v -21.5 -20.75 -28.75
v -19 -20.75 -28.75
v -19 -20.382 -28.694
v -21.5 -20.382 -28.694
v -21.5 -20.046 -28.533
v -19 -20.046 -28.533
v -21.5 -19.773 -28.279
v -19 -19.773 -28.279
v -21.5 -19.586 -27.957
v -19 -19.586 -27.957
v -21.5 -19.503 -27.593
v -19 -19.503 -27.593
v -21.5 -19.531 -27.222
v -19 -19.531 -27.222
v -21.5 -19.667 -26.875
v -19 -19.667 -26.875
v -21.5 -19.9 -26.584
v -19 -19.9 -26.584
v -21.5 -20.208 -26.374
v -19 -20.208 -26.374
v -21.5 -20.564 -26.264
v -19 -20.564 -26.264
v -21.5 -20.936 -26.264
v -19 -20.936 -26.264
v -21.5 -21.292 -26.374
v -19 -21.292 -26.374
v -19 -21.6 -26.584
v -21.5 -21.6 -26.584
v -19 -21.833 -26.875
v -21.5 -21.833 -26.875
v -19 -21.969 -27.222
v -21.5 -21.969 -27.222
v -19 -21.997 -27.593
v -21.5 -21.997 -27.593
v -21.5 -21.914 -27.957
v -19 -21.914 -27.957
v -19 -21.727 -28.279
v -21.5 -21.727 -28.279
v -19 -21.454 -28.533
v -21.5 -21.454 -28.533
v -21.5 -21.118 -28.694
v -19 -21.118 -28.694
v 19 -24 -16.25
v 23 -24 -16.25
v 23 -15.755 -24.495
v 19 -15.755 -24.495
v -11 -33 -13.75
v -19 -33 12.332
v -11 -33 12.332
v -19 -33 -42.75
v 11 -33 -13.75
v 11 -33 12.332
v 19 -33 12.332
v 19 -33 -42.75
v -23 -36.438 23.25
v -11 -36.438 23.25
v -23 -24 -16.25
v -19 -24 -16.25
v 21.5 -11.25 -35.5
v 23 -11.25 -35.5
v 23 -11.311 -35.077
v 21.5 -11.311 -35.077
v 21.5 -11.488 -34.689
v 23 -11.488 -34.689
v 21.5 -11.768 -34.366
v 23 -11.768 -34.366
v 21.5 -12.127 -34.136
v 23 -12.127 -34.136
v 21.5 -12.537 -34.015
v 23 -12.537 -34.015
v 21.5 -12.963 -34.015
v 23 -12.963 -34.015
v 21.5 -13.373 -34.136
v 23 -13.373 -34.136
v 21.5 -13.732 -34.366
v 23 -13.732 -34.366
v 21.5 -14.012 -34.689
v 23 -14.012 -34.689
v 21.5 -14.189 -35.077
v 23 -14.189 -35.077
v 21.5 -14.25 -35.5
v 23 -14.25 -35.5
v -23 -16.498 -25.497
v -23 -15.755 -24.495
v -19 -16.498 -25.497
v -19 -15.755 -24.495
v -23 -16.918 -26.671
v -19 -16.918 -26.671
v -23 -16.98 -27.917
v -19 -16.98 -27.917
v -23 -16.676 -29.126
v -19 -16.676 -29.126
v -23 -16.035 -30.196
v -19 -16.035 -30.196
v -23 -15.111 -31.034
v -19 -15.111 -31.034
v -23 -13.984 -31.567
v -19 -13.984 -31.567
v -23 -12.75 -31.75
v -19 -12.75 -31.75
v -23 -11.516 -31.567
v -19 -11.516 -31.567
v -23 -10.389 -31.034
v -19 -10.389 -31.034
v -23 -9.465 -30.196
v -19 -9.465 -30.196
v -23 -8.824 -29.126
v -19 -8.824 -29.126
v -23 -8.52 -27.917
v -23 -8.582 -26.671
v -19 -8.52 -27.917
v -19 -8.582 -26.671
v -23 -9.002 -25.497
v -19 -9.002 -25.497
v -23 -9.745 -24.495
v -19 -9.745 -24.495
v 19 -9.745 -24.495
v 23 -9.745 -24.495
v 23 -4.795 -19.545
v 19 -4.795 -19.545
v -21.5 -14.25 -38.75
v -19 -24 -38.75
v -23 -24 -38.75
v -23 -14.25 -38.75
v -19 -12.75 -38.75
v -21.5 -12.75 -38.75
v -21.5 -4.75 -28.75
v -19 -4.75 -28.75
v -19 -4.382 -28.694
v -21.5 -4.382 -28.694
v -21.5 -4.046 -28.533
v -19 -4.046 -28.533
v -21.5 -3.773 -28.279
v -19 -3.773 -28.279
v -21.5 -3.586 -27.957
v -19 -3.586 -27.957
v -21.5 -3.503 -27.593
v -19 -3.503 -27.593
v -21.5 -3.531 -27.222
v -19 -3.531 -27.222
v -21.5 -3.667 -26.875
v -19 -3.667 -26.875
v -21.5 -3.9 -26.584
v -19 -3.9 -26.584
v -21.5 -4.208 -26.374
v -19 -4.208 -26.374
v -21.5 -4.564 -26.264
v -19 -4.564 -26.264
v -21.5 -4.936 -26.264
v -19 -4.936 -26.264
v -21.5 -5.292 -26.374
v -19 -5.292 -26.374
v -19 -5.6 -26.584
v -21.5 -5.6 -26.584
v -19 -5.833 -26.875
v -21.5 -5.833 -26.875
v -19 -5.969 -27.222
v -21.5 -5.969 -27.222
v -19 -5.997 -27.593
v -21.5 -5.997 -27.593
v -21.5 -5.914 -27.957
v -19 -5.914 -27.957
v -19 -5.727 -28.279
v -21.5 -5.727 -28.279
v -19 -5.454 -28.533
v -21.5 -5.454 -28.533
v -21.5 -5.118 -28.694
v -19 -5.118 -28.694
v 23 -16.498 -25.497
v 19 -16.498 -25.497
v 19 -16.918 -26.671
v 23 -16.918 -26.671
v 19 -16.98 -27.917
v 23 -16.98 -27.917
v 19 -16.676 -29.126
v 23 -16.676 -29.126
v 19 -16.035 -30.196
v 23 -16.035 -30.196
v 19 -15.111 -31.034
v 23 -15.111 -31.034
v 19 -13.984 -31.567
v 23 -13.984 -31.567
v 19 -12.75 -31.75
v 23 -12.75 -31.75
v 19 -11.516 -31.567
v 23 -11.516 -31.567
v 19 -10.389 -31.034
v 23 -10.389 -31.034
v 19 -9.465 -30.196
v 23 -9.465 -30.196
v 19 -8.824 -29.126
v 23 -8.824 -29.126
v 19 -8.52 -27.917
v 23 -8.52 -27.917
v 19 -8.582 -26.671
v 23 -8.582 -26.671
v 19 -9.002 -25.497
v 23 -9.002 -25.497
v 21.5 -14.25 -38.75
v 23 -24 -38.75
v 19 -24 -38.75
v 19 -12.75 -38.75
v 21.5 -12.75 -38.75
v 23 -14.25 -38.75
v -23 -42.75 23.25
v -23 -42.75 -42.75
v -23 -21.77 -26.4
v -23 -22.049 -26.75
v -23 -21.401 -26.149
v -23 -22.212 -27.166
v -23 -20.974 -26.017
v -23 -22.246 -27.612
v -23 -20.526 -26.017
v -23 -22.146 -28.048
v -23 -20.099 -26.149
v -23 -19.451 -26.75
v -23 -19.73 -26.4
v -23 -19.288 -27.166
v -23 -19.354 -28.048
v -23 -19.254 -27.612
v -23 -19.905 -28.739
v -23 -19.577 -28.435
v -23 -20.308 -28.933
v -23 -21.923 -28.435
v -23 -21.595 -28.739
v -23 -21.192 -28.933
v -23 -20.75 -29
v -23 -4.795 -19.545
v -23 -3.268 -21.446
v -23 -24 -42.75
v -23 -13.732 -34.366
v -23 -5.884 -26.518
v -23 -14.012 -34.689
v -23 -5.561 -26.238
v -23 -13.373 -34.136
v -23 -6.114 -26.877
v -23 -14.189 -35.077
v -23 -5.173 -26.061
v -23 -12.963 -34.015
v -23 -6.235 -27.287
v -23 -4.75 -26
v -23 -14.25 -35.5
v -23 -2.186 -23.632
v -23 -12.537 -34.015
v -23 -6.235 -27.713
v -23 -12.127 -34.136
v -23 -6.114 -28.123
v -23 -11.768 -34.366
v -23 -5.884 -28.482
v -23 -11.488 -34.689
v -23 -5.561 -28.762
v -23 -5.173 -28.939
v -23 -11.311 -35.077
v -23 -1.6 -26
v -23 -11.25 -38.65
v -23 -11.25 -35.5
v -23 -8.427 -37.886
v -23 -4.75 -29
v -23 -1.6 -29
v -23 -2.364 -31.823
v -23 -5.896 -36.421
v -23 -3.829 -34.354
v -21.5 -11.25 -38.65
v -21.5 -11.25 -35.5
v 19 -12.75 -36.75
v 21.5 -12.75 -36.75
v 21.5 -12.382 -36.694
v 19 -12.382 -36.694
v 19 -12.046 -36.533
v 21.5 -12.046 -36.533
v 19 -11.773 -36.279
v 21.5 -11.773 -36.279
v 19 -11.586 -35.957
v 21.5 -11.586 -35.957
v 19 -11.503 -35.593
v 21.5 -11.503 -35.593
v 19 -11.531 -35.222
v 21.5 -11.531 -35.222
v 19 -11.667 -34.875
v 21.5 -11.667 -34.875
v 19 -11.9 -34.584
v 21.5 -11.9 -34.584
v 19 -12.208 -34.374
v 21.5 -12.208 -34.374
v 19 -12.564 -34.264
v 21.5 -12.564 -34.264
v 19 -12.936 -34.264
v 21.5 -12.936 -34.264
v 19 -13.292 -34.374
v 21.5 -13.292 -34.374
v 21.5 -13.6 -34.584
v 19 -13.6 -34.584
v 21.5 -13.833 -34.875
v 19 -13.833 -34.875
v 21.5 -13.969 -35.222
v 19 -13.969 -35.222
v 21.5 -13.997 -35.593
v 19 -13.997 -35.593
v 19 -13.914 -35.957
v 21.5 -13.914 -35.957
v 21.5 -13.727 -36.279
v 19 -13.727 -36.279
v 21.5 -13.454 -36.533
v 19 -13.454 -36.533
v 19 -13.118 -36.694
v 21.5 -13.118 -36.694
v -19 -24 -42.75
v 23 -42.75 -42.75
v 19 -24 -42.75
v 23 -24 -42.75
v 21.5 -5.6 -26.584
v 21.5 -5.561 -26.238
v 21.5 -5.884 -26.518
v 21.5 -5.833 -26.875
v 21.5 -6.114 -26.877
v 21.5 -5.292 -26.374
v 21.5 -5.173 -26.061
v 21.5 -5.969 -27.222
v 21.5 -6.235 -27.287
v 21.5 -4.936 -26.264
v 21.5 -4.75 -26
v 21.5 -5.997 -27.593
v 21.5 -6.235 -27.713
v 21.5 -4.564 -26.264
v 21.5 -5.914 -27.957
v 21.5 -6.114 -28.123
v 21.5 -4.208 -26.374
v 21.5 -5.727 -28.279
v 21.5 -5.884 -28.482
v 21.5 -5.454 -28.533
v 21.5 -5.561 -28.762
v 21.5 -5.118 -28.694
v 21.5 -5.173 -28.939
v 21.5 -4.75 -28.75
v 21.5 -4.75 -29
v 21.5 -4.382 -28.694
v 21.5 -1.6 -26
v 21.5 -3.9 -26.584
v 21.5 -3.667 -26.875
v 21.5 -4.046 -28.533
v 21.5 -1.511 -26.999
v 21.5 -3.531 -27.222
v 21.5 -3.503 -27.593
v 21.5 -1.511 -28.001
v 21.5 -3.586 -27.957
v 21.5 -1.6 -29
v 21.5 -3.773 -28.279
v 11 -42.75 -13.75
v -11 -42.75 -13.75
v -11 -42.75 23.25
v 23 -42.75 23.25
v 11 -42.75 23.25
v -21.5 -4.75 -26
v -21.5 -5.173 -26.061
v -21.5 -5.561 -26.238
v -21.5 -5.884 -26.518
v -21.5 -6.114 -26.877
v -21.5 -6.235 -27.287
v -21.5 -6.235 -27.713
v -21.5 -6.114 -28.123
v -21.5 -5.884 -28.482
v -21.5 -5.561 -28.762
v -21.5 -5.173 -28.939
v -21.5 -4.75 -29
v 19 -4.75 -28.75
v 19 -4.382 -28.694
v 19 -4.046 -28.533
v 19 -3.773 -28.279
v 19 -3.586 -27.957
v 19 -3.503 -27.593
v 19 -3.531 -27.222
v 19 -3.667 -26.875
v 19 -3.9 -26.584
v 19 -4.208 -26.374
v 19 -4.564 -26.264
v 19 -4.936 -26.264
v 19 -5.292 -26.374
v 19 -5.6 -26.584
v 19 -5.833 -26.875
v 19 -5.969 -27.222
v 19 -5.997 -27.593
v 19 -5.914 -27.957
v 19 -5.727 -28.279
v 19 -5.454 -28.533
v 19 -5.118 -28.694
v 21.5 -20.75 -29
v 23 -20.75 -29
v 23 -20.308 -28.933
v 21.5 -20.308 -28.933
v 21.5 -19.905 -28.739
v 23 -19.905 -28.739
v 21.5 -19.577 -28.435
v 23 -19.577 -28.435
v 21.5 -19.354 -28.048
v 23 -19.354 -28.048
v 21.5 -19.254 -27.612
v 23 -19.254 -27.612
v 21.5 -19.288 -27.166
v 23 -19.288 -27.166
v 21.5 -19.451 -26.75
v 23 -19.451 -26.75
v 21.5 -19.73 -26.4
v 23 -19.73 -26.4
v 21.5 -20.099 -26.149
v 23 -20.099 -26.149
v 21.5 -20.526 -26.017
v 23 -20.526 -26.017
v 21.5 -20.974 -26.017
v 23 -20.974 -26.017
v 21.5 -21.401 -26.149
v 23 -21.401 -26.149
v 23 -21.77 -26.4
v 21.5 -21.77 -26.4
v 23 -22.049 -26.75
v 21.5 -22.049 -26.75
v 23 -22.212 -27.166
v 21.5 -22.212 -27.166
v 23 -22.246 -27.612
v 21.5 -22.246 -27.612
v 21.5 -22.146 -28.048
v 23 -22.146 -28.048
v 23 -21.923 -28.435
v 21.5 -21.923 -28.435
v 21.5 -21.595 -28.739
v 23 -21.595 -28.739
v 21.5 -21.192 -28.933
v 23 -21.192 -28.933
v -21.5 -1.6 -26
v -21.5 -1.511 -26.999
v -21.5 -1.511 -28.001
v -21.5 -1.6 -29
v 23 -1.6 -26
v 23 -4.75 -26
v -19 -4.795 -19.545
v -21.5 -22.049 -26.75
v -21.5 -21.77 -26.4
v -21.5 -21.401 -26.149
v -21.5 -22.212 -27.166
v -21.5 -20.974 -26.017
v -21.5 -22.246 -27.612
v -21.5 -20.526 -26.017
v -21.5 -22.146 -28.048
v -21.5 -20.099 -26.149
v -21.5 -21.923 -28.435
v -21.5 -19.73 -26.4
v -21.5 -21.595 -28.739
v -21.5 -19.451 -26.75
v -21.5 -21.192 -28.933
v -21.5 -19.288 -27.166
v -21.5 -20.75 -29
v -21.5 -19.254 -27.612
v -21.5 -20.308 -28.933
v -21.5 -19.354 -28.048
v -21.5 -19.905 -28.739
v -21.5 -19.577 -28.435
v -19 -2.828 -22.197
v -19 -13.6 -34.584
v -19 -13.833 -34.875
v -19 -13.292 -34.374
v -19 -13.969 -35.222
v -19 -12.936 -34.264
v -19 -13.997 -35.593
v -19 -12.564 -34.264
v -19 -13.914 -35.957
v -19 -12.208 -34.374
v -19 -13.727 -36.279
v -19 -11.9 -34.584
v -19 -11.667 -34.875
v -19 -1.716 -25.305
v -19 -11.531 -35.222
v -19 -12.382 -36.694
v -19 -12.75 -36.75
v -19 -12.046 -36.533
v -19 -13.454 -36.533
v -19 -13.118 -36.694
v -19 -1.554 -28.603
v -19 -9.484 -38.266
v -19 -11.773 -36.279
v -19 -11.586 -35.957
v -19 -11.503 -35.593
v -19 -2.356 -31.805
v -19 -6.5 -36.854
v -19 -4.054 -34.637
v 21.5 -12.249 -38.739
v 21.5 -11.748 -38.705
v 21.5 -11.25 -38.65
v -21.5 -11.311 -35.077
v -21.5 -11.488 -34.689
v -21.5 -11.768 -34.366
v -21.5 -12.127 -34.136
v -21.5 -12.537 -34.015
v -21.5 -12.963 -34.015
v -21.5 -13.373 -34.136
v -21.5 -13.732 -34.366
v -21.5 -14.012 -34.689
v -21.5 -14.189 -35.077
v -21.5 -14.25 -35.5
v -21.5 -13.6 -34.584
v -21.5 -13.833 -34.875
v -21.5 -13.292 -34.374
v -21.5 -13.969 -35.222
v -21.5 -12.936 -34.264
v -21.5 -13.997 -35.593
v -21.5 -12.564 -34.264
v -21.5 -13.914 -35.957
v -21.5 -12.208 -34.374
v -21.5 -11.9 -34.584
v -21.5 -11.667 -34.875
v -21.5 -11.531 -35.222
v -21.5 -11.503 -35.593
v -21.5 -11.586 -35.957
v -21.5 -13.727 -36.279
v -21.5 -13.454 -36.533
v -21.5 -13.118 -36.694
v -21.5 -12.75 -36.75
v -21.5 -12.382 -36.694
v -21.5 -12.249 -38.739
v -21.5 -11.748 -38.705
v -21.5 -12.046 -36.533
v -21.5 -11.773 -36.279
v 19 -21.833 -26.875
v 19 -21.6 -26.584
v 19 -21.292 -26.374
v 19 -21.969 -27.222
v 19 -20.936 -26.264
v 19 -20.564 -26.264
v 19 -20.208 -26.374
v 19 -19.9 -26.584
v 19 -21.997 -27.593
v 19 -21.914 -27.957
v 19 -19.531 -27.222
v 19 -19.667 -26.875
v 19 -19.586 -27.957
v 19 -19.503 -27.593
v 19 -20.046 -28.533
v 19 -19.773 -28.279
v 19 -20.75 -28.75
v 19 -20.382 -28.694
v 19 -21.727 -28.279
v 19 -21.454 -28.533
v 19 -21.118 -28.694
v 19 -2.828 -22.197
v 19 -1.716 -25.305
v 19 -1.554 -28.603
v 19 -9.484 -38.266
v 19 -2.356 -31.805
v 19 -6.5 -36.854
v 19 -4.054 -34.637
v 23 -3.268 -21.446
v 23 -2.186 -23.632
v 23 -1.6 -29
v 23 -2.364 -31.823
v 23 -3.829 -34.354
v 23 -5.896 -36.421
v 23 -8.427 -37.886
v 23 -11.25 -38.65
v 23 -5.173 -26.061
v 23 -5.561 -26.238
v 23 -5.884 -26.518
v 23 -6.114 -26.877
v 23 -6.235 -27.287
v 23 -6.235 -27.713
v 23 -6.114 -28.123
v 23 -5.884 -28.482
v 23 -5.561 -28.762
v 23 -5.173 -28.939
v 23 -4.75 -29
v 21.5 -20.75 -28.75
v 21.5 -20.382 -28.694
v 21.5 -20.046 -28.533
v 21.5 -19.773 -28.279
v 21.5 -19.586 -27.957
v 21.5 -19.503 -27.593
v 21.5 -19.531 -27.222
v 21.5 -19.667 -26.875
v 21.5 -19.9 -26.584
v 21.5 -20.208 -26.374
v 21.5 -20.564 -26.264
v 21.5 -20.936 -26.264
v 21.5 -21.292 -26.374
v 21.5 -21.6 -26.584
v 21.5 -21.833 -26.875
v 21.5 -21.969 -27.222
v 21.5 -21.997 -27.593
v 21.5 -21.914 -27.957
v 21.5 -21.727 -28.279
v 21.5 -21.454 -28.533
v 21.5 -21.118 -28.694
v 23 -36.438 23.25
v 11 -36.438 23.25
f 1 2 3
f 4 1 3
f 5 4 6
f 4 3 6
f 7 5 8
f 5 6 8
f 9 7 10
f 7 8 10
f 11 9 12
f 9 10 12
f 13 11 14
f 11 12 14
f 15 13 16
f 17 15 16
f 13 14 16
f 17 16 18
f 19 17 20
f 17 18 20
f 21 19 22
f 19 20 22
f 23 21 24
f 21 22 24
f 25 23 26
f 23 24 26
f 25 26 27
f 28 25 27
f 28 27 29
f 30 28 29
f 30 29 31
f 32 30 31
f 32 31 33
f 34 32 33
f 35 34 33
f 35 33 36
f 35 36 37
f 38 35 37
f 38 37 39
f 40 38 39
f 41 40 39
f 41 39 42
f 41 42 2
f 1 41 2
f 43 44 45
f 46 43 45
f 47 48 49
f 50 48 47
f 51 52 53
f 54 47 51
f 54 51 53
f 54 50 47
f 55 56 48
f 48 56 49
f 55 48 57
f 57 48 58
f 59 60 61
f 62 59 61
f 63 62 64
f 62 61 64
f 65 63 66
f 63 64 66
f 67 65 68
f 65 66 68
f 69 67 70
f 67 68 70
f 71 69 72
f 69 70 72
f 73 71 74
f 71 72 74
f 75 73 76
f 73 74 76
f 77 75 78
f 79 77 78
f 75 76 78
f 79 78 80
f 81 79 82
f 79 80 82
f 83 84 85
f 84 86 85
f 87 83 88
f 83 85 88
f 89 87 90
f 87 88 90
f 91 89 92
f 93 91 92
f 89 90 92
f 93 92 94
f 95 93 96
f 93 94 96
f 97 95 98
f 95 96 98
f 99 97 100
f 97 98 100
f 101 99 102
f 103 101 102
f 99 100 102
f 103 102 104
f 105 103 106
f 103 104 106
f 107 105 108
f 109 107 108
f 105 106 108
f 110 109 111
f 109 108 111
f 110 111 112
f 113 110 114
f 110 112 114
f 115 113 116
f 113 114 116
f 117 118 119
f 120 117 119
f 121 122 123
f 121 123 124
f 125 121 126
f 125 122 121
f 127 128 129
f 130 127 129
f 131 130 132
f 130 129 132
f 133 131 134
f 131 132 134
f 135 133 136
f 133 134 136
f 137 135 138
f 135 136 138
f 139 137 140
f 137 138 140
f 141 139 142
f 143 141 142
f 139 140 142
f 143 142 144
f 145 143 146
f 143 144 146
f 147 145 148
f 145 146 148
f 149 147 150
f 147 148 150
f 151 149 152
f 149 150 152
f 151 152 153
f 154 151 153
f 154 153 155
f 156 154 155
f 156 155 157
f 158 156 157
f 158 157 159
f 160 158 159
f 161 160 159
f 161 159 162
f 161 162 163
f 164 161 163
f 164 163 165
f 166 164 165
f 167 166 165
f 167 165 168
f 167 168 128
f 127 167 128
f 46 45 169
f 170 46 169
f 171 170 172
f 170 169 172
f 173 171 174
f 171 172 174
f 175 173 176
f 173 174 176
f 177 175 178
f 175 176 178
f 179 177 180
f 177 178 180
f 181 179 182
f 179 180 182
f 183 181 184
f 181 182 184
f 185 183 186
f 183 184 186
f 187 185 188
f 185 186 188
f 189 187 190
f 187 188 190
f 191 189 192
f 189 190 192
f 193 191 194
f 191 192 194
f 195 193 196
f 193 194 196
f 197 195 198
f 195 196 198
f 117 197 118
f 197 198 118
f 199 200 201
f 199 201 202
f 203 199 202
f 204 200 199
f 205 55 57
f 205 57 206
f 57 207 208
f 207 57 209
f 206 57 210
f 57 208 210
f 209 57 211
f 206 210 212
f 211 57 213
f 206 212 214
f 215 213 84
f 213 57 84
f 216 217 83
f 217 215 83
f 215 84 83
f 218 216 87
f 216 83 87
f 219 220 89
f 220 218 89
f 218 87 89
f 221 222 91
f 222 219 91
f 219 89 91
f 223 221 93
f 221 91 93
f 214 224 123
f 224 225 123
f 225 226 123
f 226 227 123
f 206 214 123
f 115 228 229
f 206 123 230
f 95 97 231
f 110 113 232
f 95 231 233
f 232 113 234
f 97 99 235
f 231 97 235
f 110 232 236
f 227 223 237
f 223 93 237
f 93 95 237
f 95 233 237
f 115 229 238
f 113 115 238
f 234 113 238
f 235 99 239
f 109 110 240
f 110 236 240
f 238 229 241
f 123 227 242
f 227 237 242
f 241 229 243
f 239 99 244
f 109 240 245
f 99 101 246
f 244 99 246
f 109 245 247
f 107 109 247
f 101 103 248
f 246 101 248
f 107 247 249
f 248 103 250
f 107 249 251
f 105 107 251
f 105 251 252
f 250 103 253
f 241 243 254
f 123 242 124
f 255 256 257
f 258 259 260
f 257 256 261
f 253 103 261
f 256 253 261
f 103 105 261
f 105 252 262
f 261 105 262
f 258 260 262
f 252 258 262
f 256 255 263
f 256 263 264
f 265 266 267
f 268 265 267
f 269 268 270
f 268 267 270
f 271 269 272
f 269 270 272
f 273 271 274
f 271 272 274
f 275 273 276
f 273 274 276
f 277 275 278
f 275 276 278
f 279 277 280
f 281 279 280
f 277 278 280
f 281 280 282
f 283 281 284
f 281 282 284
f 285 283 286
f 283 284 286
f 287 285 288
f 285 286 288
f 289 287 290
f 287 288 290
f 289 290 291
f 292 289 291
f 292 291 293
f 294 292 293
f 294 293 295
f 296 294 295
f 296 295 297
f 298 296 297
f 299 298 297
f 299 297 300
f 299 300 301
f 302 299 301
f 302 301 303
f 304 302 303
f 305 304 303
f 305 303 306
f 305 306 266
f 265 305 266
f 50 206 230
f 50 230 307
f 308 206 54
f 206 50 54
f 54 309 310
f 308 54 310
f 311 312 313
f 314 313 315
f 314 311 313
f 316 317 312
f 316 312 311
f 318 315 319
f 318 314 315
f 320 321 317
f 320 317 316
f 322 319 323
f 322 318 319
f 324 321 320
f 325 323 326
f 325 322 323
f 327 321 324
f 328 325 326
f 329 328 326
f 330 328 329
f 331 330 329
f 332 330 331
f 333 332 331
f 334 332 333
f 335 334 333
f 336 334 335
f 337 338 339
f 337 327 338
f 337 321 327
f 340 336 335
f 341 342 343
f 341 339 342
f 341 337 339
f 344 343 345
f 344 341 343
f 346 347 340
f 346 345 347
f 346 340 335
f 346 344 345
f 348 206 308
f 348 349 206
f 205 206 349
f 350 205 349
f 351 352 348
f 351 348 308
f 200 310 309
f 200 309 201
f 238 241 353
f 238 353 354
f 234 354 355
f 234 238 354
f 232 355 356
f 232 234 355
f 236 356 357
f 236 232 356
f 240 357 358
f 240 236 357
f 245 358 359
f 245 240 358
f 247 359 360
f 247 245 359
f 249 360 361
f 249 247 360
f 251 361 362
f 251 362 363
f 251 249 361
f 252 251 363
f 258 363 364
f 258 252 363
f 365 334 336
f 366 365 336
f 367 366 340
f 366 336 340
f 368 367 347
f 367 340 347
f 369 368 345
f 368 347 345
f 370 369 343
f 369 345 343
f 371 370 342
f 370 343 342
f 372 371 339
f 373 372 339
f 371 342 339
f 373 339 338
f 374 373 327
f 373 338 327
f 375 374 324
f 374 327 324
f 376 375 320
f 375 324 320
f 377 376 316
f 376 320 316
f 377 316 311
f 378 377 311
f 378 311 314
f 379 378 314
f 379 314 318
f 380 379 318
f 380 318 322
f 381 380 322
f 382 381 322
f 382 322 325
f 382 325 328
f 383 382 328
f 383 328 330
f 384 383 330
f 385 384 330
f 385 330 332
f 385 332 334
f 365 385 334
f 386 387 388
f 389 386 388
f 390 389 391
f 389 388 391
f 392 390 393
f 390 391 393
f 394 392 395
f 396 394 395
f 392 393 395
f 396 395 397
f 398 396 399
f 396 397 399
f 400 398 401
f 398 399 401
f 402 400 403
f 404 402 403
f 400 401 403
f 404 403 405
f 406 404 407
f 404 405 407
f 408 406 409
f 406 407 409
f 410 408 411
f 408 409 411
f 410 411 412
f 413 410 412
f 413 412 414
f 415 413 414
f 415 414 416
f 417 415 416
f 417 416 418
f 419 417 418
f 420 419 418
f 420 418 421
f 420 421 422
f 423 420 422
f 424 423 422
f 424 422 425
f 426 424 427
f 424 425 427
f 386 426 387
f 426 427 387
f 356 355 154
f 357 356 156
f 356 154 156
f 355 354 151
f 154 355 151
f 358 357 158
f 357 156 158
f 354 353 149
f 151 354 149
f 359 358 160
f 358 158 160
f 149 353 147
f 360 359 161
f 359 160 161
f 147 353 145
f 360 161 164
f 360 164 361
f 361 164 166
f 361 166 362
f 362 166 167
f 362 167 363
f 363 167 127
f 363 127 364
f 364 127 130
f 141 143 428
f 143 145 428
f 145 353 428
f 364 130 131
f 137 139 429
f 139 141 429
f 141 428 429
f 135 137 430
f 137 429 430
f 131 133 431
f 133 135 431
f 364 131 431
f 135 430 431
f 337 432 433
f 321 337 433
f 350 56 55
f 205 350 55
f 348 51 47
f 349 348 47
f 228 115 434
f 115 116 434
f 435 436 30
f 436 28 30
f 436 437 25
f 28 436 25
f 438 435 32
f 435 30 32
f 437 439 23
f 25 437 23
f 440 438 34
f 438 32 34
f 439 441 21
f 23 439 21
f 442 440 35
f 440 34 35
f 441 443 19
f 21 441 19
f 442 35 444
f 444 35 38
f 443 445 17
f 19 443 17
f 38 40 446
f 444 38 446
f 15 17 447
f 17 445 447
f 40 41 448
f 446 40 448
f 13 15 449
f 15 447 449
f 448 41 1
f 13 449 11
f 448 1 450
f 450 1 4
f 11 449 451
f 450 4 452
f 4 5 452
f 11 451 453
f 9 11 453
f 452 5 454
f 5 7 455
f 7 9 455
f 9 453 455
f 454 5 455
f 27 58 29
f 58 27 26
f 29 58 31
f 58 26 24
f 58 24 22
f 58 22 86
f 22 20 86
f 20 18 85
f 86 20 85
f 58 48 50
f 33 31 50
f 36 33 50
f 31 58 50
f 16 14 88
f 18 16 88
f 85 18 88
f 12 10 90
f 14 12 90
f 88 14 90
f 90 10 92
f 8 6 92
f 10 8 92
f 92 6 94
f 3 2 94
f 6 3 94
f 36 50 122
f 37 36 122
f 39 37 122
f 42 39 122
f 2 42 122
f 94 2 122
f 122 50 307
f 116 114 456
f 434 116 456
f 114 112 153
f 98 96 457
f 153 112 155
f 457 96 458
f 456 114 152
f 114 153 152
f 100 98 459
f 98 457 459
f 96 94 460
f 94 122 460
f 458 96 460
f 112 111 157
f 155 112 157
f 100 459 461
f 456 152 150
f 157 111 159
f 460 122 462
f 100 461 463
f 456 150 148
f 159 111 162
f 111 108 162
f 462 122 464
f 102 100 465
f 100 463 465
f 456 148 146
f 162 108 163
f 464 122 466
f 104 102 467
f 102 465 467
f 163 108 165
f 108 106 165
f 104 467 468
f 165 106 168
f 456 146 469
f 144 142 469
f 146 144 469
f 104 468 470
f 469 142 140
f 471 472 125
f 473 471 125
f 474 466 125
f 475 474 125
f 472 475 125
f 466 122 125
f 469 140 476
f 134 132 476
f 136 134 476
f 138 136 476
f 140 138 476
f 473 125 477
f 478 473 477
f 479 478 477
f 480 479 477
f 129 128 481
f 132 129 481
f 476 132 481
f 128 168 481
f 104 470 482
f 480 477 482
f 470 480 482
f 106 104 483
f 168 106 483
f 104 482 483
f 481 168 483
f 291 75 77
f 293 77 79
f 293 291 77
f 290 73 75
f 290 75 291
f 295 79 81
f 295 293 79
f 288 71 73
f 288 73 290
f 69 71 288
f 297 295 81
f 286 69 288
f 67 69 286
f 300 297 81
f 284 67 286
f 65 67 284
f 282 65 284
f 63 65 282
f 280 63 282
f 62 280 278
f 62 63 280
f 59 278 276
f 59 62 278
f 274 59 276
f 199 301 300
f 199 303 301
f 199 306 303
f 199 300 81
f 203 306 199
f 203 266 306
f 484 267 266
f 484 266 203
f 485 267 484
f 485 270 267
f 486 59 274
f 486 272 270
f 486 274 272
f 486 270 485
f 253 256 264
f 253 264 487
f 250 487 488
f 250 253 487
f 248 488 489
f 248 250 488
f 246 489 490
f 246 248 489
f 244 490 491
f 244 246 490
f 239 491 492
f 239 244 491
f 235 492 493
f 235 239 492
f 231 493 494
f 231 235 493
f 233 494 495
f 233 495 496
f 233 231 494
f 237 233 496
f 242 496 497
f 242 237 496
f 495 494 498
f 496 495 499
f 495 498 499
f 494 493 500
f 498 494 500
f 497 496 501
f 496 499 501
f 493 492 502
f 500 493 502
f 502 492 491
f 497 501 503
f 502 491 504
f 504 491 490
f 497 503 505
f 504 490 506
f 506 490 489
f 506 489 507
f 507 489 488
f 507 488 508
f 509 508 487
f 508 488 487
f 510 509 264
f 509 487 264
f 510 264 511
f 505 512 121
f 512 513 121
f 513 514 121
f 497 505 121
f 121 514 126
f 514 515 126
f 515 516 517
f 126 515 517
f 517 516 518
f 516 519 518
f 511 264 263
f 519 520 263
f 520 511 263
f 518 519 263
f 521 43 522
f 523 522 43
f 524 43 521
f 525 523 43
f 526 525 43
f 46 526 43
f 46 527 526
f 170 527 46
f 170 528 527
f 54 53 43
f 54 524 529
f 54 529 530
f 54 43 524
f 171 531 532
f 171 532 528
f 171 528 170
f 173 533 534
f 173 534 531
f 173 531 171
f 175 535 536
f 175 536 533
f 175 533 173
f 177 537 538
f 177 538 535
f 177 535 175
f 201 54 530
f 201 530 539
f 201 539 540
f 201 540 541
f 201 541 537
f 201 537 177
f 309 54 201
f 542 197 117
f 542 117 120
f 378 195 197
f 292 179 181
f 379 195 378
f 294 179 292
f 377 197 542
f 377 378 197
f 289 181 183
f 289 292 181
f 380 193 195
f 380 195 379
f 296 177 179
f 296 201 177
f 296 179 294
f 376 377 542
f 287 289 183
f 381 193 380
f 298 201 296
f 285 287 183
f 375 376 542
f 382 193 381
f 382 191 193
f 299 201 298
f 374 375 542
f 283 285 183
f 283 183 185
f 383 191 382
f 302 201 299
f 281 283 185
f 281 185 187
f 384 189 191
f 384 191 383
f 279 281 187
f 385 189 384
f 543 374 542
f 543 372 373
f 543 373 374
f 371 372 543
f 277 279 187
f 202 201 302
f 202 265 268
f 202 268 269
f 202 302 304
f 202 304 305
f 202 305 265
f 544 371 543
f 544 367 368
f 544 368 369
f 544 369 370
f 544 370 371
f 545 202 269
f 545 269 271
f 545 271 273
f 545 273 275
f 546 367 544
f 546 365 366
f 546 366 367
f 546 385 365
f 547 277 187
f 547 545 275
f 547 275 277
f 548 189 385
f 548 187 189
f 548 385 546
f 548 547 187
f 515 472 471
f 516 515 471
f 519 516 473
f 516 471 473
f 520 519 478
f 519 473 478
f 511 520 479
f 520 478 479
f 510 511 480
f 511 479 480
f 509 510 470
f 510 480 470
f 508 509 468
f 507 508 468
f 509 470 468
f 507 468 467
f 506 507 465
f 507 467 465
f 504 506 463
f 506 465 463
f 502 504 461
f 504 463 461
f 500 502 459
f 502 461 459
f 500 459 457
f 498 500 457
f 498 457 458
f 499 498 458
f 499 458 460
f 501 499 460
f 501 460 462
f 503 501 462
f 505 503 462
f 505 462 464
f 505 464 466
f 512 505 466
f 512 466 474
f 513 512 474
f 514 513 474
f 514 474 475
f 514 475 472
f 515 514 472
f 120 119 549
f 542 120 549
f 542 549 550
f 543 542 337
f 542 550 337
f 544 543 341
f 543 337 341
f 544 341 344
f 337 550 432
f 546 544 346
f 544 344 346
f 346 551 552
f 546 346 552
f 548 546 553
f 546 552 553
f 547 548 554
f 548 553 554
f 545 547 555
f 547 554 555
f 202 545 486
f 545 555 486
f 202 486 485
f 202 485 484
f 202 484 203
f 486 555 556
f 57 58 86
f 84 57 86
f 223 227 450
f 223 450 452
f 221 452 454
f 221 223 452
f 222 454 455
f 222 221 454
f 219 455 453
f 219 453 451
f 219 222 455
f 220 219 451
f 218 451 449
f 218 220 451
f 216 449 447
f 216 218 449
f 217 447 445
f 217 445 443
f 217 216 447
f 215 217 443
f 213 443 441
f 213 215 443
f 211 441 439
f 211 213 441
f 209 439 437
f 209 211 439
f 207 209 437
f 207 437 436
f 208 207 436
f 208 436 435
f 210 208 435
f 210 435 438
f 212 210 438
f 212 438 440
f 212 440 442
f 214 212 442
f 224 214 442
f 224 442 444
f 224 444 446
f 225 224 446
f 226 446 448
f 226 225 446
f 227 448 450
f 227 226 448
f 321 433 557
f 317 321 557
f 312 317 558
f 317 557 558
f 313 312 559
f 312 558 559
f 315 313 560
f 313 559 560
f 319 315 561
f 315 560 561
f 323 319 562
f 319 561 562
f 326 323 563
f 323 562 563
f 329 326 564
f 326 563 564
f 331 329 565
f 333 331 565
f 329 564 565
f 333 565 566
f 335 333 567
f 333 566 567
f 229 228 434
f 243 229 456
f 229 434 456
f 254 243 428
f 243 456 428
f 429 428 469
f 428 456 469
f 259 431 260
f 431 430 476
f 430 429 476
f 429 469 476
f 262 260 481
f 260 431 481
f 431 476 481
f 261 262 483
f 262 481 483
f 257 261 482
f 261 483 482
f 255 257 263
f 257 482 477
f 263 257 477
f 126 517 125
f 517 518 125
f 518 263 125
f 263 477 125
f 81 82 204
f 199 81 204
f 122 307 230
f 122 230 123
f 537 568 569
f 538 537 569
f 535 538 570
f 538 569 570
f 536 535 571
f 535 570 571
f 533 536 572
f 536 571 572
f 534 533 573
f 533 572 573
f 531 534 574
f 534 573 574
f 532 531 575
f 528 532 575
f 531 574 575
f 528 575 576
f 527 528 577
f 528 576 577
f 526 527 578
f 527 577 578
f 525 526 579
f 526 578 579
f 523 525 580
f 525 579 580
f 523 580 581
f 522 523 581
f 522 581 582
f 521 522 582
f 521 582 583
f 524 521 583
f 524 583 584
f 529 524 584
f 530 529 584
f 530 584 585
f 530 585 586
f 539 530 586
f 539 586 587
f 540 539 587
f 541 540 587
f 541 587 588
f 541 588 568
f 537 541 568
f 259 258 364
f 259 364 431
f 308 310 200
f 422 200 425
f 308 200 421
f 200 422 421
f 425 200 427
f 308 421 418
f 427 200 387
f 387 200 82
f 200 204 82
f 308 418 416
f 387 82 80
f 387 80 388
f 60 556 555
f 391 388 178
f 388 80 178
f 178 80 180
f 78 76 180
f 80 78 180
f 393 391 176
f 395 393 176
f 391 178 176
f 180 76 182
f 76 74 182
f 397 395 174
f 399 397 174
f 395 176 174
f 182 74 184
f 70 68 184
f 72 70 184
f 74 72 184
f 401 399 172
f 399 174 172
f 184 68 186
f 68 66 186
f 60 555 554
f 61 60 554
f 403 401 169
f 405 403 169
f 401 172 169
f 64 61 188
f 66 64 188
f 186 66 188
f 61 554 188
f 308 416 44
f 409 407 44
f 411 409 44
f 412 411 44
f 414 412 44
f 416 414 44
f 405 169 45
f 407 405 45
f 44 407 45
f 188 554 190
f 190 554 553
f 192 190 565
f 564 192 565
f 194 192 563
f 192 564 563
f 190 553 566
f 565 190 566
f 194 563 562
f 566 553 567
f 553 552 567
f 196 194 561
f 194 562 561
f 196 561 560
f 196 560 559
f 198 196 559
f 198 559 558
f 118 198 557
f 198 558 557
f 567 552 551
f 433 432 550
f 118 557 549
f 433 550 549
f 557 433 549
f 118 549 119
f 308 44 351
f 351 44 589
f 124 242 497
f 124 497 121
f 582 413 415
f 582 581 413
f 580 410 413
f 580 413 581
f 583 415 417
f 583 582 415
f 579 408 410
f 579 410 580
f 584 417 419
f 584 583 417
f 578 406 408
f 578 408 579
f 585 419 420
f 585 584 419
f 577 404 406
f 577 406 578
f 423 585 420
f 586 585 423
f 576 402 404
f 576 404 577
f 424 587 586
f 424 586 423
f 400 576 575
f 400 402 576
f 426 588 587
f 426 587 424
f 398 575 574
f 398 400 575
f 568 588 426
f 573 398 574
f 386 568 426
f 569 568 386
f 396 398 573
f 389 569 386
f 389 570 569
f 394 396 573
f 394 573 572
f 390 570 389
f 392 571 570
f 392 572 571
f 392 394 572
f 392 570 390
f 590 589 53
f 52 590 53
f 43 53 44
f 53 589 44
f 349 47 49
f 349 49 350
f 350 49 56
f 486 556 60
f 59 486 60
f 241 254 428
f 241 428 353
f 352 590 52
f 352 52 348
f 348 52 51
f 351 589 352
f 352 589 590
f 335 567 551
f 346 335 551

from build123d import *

# Parameters (mm, degrees)
SKETCH1_W                = 50
SKETCH1_H                = 170
BOSS_EXTRUDE1_DEPTH      = 55
SKETCH2_W                = 34
SKETCH2_H                = 27
CUT_EXTRUDE1_DEPTH       = 181.416185527
SKETCH3_W                = 10
SKETCH3_H                = 24
SKETCH3_R                = 4.25
SKETCH3_R_2              = 1
CUT_EXTRUDE2_DEPTH       = 186.539753153
SKETCH4_W                = 2
SKETCH4_H                = 24
CUT_EXTRUDE3_DEPTH       = 178.623196683
SKETCH5_W                = 6.25
SKETCH5_H                = 11.25
CUT_EXTRUDE4_DEPTH       = 186.539753153
SKETCH6_W                = 38
SKETCH6_H                = 10
CUT_EXTRUDE5_DEPTH       = 181.416185527
SKETCH8_W                = 13.25
SKETCH8_H                = 2.25
CUT_EXTRUDE7_DEPTH       = 186.539753153
SKETCH9_W                = 34
SKETCH9_H                = 35.25
CUT_EXTRUDE8_DEPTH       = 179.297679458
SKETCH11_W               = 13.25
SKETCH11_H               = 20.25
CUT_EXTRUDE9_DEPTH       = 184.480414486
SKETCH12_W               = 28.5
SKETCH12_H               = 15
BOSS_EXTRUDE2_DEPTH      = 8
SKETCH14_W               = 34
SKETCH14_H               = 15
SKETCH14_H_2             = 10.25
BOSS_EXTRUDE3_DEPTH      = 13.25
SKETCH16_R               = 4.5
SKETCH16_R_2             = 2.5
CUT_EXTRUDE13_DEPTH      = 8
SKETCH17_R               = 4.5
SKETCH17_W               = 55
SKETCH17_H               = 10.25
CUT_EXTRUDE15_DEPTH      = 175.384811552
SKETCH18_W               = 71.25
SKETCH18_H               = 27.5
SKETCH18_W_2             = 13.75
SKETCH18_W_3             = 16.25
BOSS_EXTRUDE4_DEPTH      = 50
SKETCH19_W               = 38
SKETCH19_H               = 7
CUT_EXTRUDE16_DEPTH      = 152.25227271
SKETCH20_W               = 57.5
SKETCH20_H               = 27.5
CUT_EXTRUDE17_DEPTH      = 102.137591923
CUT_EXTRUDE18_DEPTH      = 100.39221549
SKETCH22_W               = 82.5
SKETCH22_H               = 2.5
BOSS_EXTRUDE5_DEPTH      = 50
SKETCH24_W               = 22
SKETCH24_H               = 17
CUT_EXTRUDE19_DEPTH      = 101.710289941
SKETCH25_W               = 38
SKETCH25_H               = 38.136363636
CUT_EXTRUDE20_DEPTH      = 10
SKETCH27_W               = 38
SKETCH27_H               = 60.136363636
BOSS_EXTRUDE6_DEPTH      = 8.6
SKETCH29_W               = 38
SKETCH29_H               = 1.4
CUT_EXTRUDE21_DEPTH      = 85.601313414
BOSS_EXTRUDE7_DEPTH      = 50
SKETCH31_W               = 38
SKETCH31_H               = 17
CUT_EXTRUDE22_DEPTH      = 117.365802537
SKETCH32_W               = 100
SKETCH32_H               = 3
CUT_EXTRUDE23_DEPTH      = 101.710289941
SKETCH33_W               = 20
SKETCH33_H               = 10
SKETCH33_W_2             = 22
SKETCH33_H_2             = 45
CUT_EXTRUDE24_DEPTH      = 84.137311118
SKETCH34_W               = 8
SKETCH34_H               = 12
CUT_EXTRUDE25_DEPTH      = 76.0787087
BOSS_EXTRUDE8_DEPTH      = 8
SKETCH37_W               = 78
SKETCH37_H               = 9
SKETCH37_W_2             = 12
CUT_EXTRUDE27_DEPTH      = 93.48006542
FILLET1_R                = 10
CUT_EXTRUDE29_DEPTH      = 77.423572934
CUT_EXTRUDE29_DEPTH_BACK = 77.423572934
SKETCH38_W               = 2
SKETCH38_H               = 78
SKETCH38_W_2             = 46
SKETCH38_H_2             = 8
SKETCH39_W               = 22.223383748
SKETCH39_H               = 19.441332461
CUT_EXTRUDE30_DEPTH      = 86.624543794
BOSS_EXTRUDE9_DEPTH      = 0.75
CUT_EXTRUDE31_DEPTH      = 76.967920861
SKETCH44_R               = 1.25
CUT_EXTRUDE32_DEPTH      = 76.967920861
SKETCH45_R               = 1.25
SKETCH45_R_2             = 1.5
CUT_EXTRUDE33_DEPTH      = 1.5


with BuildPart() as part:
    # Sketch1 → Boss-Extrude1 (new body)
    with BuildSketch(Plane.XY):
        with Locations((0, -85)):
            Rectangle(SKETCH1_W, SKETCH1_H)
    extrude(amount=-BOSS_EXTRUDE1_DEPTH)

    # Sketch2 → Cut-Extrude1 (cut, through all)
    with BuildSketch(Plane.XY):
        with Locations((0, -13.5)):
            Rectangle(SKETCH2_W, SKETCH2_H)
    extrude(amount=-CUT_EXTRUDE1_DEPTH, mode=Mode.SUBTRACT)

    # Sketch3 → Cut-Extrude2 (cut, through all)
    with BuildSketch(Plane(origin=(25, 0, 0), x_dir=(0, 0, -1), z_dir=(1, 0, 0))):
        with Locations((50, -12)):
            Rectangle(SKETCH3_W, SKETCH3_H)
        with Locations((5, -12)):
            Rectangle(SKETCH3_W, SKETCH3_H)
        with Locations(Location((27.5, -12.75, 0), (0, 0, 90))):
            Circle(SKETCH3_R)
        with Locations(Location((35.5, -12.75, 0), (0, 0, 90))):
            Circle(SKETCH3_R_2)
        with Locations(Location((27.5, -4.75, 0), (0, 0, 90))):
            Circle(SKETCH3_R_2)
        with Locations(Location((27.5, -20.75, 0), (0, 0, 90))):
            Circle(SKETCH3_R_2)
        with Locations(Location((19.5, -12.75, 0), (0, 0, 90))):
            Circle(SKETCH3_R_2)
    extrude(amount=-CUT_EXTRUDE2_DEPTH, mode=Mode.SUBTRACT)

    # Sketch4 → Cut-Extrude3 (cut, through all)
    with BuildSketch(Plane.XY.offset(-10)):
        with Locations((-18, -12)):
            Rectangle(SKETCH4_W, SKETCH4_H)
        with Locations((18, -12)):
            Rectangle(SKETCH4_W, SKETCH4_H)
    extrude(amount=-CUT_EXTRUDE3_DEPTH, mode=Mode.SUBTRACT)

    # Sketch5 → Cut-Extrude4 (cut, through all)
    with BuildSketch(Plane(origin=(25, 0, 0), x_dir=(0, 0, -1), z_dir=(1, 0, 0))):
        with BuildLine():
            Line((45, 0), (10, 0))
            Line((10, 0), (10, -12.75))
            Line((10, -12.75), (16.25, -12.75))
            ThreePointArc((16.25, -12.75), (27.5, -1.5), (38.75, -12.75))
            Line((38.75, -12.75), (45, -12.75))
            Line((45, -12.75), (45, 0))
        make_face()
        with Locations((13.125, -18.375)):
            Rectangle(SKETCH5_W, SKETCH5_H)
        with Locations((41.875, -18.375)):
            Rectangle(SKETCH5_W, SKETCH5_H)
    extrude(amount=-CUT_EXTRUDE4_DEPTH, mode=Mode.SUBTRACT)

    # Sketch6 → Cut-Extrude5 (cut, through all)
    with BuildSketch(Plane.XY):
        with Locations((0, -29)):
            Rectangle(SKETCH6_W, SKETCH6_H)
    extrude(amount=-CUT_EXTRUDE5_DEPTH, mode=Mode.SUBTRACT)

    # Sketch8 → Cut-Extrude7 (cut, through all)
    with BuildSketch(Plane(origin=(25, 0, 0), x_dir=(0, 0, -1), z_dir=(1, 0, 0))):
        with BuildLine():
            Line((27.5, -157.5), (27.5, -132.5))
            Line((27.5, -132.5), (13.25, -132.5))
            Line((13.25, -132.5), (13.25, -167.75))
            Line((13.25, -167.75), (17.25, -167.75))
            ThreePointArc((17.25, -167.75), (20.252155493, -160.502155493), (27.5, -157.5))
        make_face()
        with BuildLine():
            Line((41.75, -167.75), (41.75, -132.5))
            Line((41.75, -132.5), (27.5, -132.5))
            Line((27.5, -132.5), (27.5, -157.5))
            ThreePointArc((27.5, -157.5), (34.747844507, -160.502155493), (37.75, -167.75))
            Line((37.75, -167.75), (41.75, -167.75))
        make_face()
        with Locations((48.375, -168.875)):
            Rectangle(SKETCH8_W, SKETCH8_H)
        with Locations((6.625, -168.875)):
            Rectangle(SKETCH8_W, SKETCH8_H)
        with BuildLine():
            Line((17.25, -167.75), (13.25, -167.75))
            Line((13.25, -167.75), (13.25, -170))
            Line((13.25, -170), (17.5, -170))
            ThreePointArc((17.5, -170), (17.31269172, -168.881923142), (17.25, -167.75))
        make_face()
        with BuildLine():
            Line((41.75, -170), (41.75, -167.75))
            Line((41.75, -167.75), (37.75, -167.75))
            ThreePointArc((37.75, -167.75), (37.68730828, -168.881923142), (37.5, -170))
            Line((37.5, -170), (41.75, -170))
        make_face()
        with BuildLine():
            Line((27.5, -167.75), (27.5, -157.5))
            ThreePointArc((27.5, -157.5), (20.252155493, -160.502155493), (17.25, -167.75))
            Line((17.25, -167.75), (27.5, -167.75))
        make_face()
        with BuildLine():
            ThreePointArc((37.75, -167.75), (34.747844507, -160.502155493), (27.5, -157.5))
            Line((27.5, -157.5), (27.5, -167.75))
            Line((27.5, -167.75), (37.75, -167.75))
        make_face()
        with BuildLine():
            Line((27.5, -170), (27.5, -167.75))
            Line((27.5, -167.75), (17.25, -167.75))
            ThreePointArc((17.25, -167.75), (17.31269172, -168.881923142), (17.5, -170))
            Line((17.5, -170), (27.5, -170))
        make_face()
        with BuildLine():
            ThreePointArc((37.5, -170), (37.68730828, -168.881923142), (37.75, -167.75))
            Line((37.75, -167.75), (27.5, -167.75))
            Line((27.5, -167.75), (27.5, -170))
            Line((27.5, -170), (37.5, -170))
        make_face()
    extrude(amount=-CUT_EXTRUDE7_DEPTH, mode=Mode.SUBTRACT)

    # Sketch9 → Cut-Extrude8 (cut, through all)
    with BuildSketch(Plane.XY):
        with Locations((0, -150.125)):
            Rectangle(SKETCH9_W, SKETCH9_H)
    extrude(amount=-CUT_EXTRUDE8_DEPTH, mode=Mode.SUBTRACT)

    # Sketch11 → Cut-Extrude9 (cut, through all)
    with BuildSketch(Plane(origin=(25, 0, 0), x_dir=(0, 0, -1), z_dir=(1, 0, 0))):
        with BuildLine():
            ThreePointArc((17.25, -167.75), (20.252155493, -160.502155493), (27.5, -157.5))
            Line((27.5, -157.5), (27.5, -147.5))
            Line((27.5, -147.5), (13.25, -147.5))
            Line((13.25, -147.5), (13.25, -167.75))
            Line((13.25, -167.75), (17.25, -167.75))
        make_face()
        with BuildLine():
            Line((27.5, -147.5), (27.5, -157.5))
            ThreePointArc((27.5, -157.5), (34.747844507, -160.502155493), (37.75, -167.75))
            Line((37.75, -167.75), (41.75, -167.75))
            Line((41.75, -167.75), (41.75, -147.5))
            Line((41.75, -147.5), (27.5, -147.5))
        make_face()
        with Locations((48.375, -157.625)):
            Rectangle(SKETCH11_W, SKETCH11_H)
        with Locations((6.625, -157.625)):
            Rectangle(SKETCH11_W, SKETCH11_H)
    extrude(amount=-CUT_EXTRUDE9_DEPTH, mode=Mode.SUBTRACT)

    # Sketch12 → Boss-Extrude2 (add)
    with BuildSketch(Plane(origin=(25, 0, 0), x_dir=(0, 0, -1), z_dir=(1, 0, 0))):
        with Locations((27.5, -140)):
            Rectangle(SKETCH12_W, SKETCH12_H)
    boss_extrude2 = extrude(amount=-BOSS_EXTRUDE2_DEPTH)

    # Mirror1: Boss-Extrude2 across plane
    add(boss_extrude2.mirror(Plane(origin=(0, 0, 0), x_dir=(0, 0, 1), z_dir=(1, 0, 0))))

    # Sketch14 → Boss-Extrude3 (add)
    with BuildSketch(Plane.XY):
        with Locations((0, -140)):
            Rectangle(SKETCH14_W, SKETCH14_H)
        with Locations((0, -152.625)):
            Rectangle(SKETCH14_W, SKETCH14_H_2)
    boss_extrude3 = extrude(amount=-BOSS_EXTRUDE3_DEPTH)

    # Mirror2: Boss-Extrude3 across plane
    add(boss_extrude3.mirror(Plane.XY.offset(-27.5)))

    # Sketch16 → Cut-Extrude13 (cut)
    # profile 1 of 3: a face of its own
    with BuildSketch(Plane(origin=(25, 0, 0), x_dir=(0, 0, -1), z_dir=(1, 0, 0))):
        with Locations(Location((16.5, -135.75, 0), (0, 0, 90))):
            Circle(SKETCH16_R)
        with Locations((16.5, -135.75)):
            Circle(SKETCH16_R_2, mode=Mode.SUBTRACT)
    # profile 2 of 3: a face of its own
    with BuildSketch(Plane(origin=(25, 0, 0), x_dir=(0, 0, -1), z_dir=(1, 0, 0))):
        with Locations((16.5, -135.75)):
            Circle(SKETCH16_R_2)
    # profile 3 of 3: a face of its own
    with BuildSketch(Plane(origin=(25, 0, 0), x_dir=(0, 0, -1), z_dir=(1, 0, 0))):
        with Locations(Location((38.5, -135.75, 0), (0, 0, 90))):
            Circle(SKETCH16_R)
    cut_extrude13 = extrude(amount=-CUT_EXTRUDE13_DEPTH, mode=Mode.SUBTRACT)

    # Mirror3: Cut-Extrude13 across plane
    add(cut_extrude13.mirror(Plane(origin=(0, 0, 0), x_dir=(0, 0, 1), z_dir=(1, 0, 0))), mode=Mode.SUBTRACT)

    # Sketch17 → Cut-Extrude15 (cut, through all)
    # profile 1 of 4: a face of its own
    with BuildSketch(Plane(origin=(25, 0, 0), x_dir=(0, 0, -1), z_dir=(1, 0, 0))):
        Polygon((55, -51.5), (27.5, -51.5), (0, -51.5), (0, -147.5), (55, -147.5), align=None)
        with Locations((16.5, -135.75)):
            Circle(SKETCH17_R, mode=Mode.SUBTRACT)
        with Locations((38.5, -135.75)):
            Circle(SKETCH17_R, mode=Mode.SUBTRACT)
    # profile 2 of 4: a face of its own
    with BuildSketch(Plane(origin=(25, 0, 0), x_dir=(0, 0, -1), z_dir=(1, 0, 0))):
        with Locations((27.5, -152.625)):
            Rectangle(SKETCH17_W, SKETCH17_H)
    # profile 3 of 4: a face of its own
    with BuildSketch(Plane(origin=(25, 0, 0), x_dir=(0, 0, -1), z_dir=(1, 0, 0))):
        with Locations((38.5, -135.75)):
            Circle(SKETCH17_R)
    # profile 4 of 4: a face of its own
    with BuildSketch(Plane(origin=(25, 0, 0), x_dir=(0, 0, -1), z_dir=(1, 0, 0))):
        with Locations((16.5, -135.75)):
            Circle(SKETCH17_R)
    extrude(amount=-CUT_EXTRUDE15_DEPTH, mode=Mode.SUBTRACT)

    # Sketch18 → Boss-Extrude4 (add)
    with BuildSketch(Plane(origin=(25, 0, 0), x_dir=(0, 0, -1), z_dir=(1, 0, 0))):
        with Locations((-35.625, -37.75)):
            Rectangle(SKETCH18_W, SKETCH18_H)
        with Locations((61.875, -37.75)):
            Rectangle(SKETCH18_W_2, SKETCH18_H)
        Polygon((38.75, -51.5), (38.75, -24), (16.25, -24), (0, -24), (0, -51.5), align=None)
        with Locations((46.875, -37.75)):
            Rectangle(SKETCH18_W_3, SKETCH18_H)
    extrude(amount=-BOSS_EXTRUDE4_DEPTH)

    # Sketch19 → Cut-Extrude16 (cut, through all)
    with BuildSketch(Plane.XY.offset(71.25)):
        with Locations((0, -27.5)):
            Rectangle(SKETCH19_W, SKETCH19_H)
    extrude(amount=-CUT_EXTRUDE16_DEPTH, mode=Mode.SUBTRACT)

    # Sketch20 → Cut-Extrude17 (cut, through all)
    with BuildSketch(Plane(origin=(25, 0, 0), x_dir=(0, 0, -1), z_dir=(1, 0, 0))):
        with Locations((-42.5, -37.75)):
            Rectangle(SKETCH20_W, SKETCH20_H)
    extrude(amount=-CUT_EXTRUDE17_DEPTH, mode=Mode.SUBTRACT)

    # Sketch21 → Cut-Extrude18 (cut, through all)
    with BuildSketch(Plane(origin=(25, 0, 0), x_dir=(0, 0, -1), z_dir=(1, 0, 0))):
        Polygon((16.25, -24), (-13.75, -51.5), (-13.75, -24), align=None)
    extrude(amount=-CUT_EXTRUDE18_DEPTH, mode=Mode.SUBTRACT)

    # Sketch22 → Boss-Extrude5 (add)
    with BuildSketch(Plane(origin=(25, 0, 0), x_dir=(0, 0, -1), z_dir=(1, 0, 0))):
        with Locations((27.5, -52.75)):
            Rectangle(SKETCH22_W, SKETCH22_H)
    extrude(amount=-BOSS_EXTRUDE5_DEPTH)

    # Sketch24 → Cut-Extrude19 (cut, through all)
    with BuildSketch(Plane(origin=(25, 0, 0), x_dir=(0, 0, -1), z_dir=(1, 0, 0))):
        with Locations((57.75, -32.5)):
            Rectangle(SKETCH24_W, SKETCH24_H)
    extrude(amount=-CUT_EXTRUDE19_DEPTH, mode=Mode.SUBTRACT)

    # Sketch25 → Cut-Extrude20 (cut)
    with BuildSketch(Plane(origin=(0, -31, 0), x_dir=(1, 0, 0), z_dir=(0, 1, 0))):
        with Locations((0, 27.681818182)):
            Rectangle(SKETCH25_W, SKETCH25_H)
    extrude(amount=-CUT_EXTRUDE20_DEPTH, mode=Mode.SUBTRACT)

    # Sketch27 → Boss-Extrude6 (add)
    with BuildSketch(Plane(origin=(0, -41, 0), x_dir=(1, 0, 0), z_dir=(0, 1, 0))):
        with Locations((0, 38.681818182)):
            Rectangle(SKETCH27_W, SKETCH27_H)
    extrude(amount=BOSS_EXTRUDE6_DEPTH)

    # Sketch29 → Cut-Extrude21 (cut, through all)
    with BuildSketch(Plane(origin=(0, 0, -8.613636364), x_dir=(-1, 0, 0), z_dir=(0, 0, -1))):
        with Locations((0, -31.7)):
            Rectangle(SKETCH29_W, SKETCH29_H)
    extrude(amount=-CUT_EXTRUDE21_DEPTH, mode=Mode.SUBTRACT)

    # Sketch30 → Boss-Extrude7 (add)
    with BuildSketch(Plane.ZY.offset(25)):
        Polygon((31.25, -38.957214173), (-16.25, -24), (-7.086363636, -32.4), (13.75, -51.5), (13.75, -53.914428346), (31.25, -53.914428346), align=None)
        Polygon((-16.25, -24), (-16.25, -32.4), (-7.086363636, -32.4), align=None)
    extrude(amount=-BOSS_EXTRUDE7_DEPTH)

    # Sketch31 → Cut-Extrude22 (cut, through all)
    with BuildSketch(Plane(origin=(0, 0, -68.75), x_dir=(-1, 0, 0), z_dir=(0, 0, -1))):
        with Locations((0, -32.5)):
            Rectangle(SKETCH31_W, SKETCH31_H)
    extrude(amount=-CUT_EXTRUDE22_DEPTH, mode=Mode.SUBTRACT)

    # Sketch32 → Cut-Extrude23 (cut, through all)
    with BuildSketch(Plane(origin=(25, 0, 0), x_dir=(0, 0, -1), z_dir=(1, 0, 0))):
        with Locations((18.75, -52.5)):
            Rectangle(SKETCH32_W, SKETCH32_H)
    extrude(amount=-CUT_EXTRUDE23_DEPTH, mode=Mode.SUBTRACT)

    # Sketch33 → Cut-Extrude24 (cut, through all)
    with BuildSketch(Plane(origin=(0, -41, 0), x_dir=(1, 0, 0), z_dir=(0, 1, 0))):
        Polygon((-10, 68.75), (-25, 68.75), (-25, 46.75), (-19, 46.75), (-10, 46.75), (-10, 58.75), align=None)
        Polygon((25, 68.75), (10, 68.75), (10, 58.75), (10, 46.75), (19, 46.75), (25, 46.75), align=None)
        with Locations((0, 63.75)):
            Rectangle(SKETCH33_W, SKETCH33_H)
        with Locations((0, -8.75)):
            Rectangle(SKETCH33_W_2, SKETCH33_H_2)
    extrude(amount=-CUT_EXTRUDE24_DEPTH, mode=Mode.SUBTRACT)

    # Sketch34 → Cut-Extrude25 (cut, through all)
    with BuildSketch(Plane(origin=(0, -41, 0), x_dir=(1, 0, 0), z_dir=(0, 1, 0))):
        with Locations((0, 52.75)):
            Rectangle(SKETCH34_W, SKETCH34_H)
    extrude(amount=-CUT_EXTRUDE25_DEPTH, mode=Mode.SUBTRACT)

    # Sketch36 → Boss-Extrude8 (add)
    with BuildSketch(Plane(origin=(0, -41, 0), x_dir=(1, 0, 0), z_dir=(0, 1, 0))):
        Polygon((4, 58.75), (4, 46.75), (-4, 46.75), (-4, 58.75), (-10, 58.75), (-10, 46.75), (-19, 46.75), (-19, -31.25), (-11, -31.25), (-11, 13.75), (11, 13.75), (11, -31.25), (19, -31.25), (19, 46.75), (10, 46.75), (10, 58.75), align=None)
    extrude(amount=BOSS_EXTRUDE8_DEPTH)

    # Sketch37 → Cut-Extrude27 (cut, through all)
    with BuildSketch(Plane(origin=(25, 0, 0), x_dir=(0, 0, -1), z_dir=(1, 0, 0))):
        with Locations((7.75, -46.5)):
            Rectangle(SKETCH37_W, SKETCH37_H)
        Polygon((-31.25, -33), (-31.25, -38.957214173), (-12.331525614, -33), align=None)
        with Locations((52.75, -46.5)):
            Rectangle(SKETCH37_W_2, SKETCH37_H)
    extrude(amount=-CUT_EXTRUDE27_DEPTH, mode=Mode.SUBTRACT)

    # Fillet1
    # the kernel refuses this fillet: 10 mm, written as the material it takes off along each edge
    with BuildSketch(Plane(origin=(20.874685928, -42, -58.75), x_dir=(0, 0, 1), z_dir=(-1, 0, 0)), Plane(origin=(34.874685928, -42, -58.75), x_dir=(0, 0, 1), z_dir=(-1, 0, 0))) as fillet1_piece_1:
        with BuildLine():
            CenterArc((9.949874371, 10), FILLET1_R, 185.739170477, 84.260829523)
            Line((0, 9), (-0.198997487, 8.98))
            ThreePointArc((-0.198997487, 8.98), (-0.2, 4.5), (-0.2, 0))
            Line((-0.2, 0), (0, -0.2))
            Line((0, -0.2), (9.949874371, -0.2))
            Line((9.949874371, -0.2), (9.949874371, 0))
        make_face()
    extrude(amount=55.749371855, mode=Mode.SUBTRACT)

    # Sketch38 → Cut-Extrude29 (cut, two sides: drawn at the far end of the back side and taken through both)
    with BuildSketch(Plane(origin=(0, 0, 0), x_dir=(1, 0, 0), z_dir=(0, 1, 0)).offset(-CUT_EXTRUDE29_DEPTH_BACK)):
        with Locations((-24, 7.75)):
            Rectangle(SKETCH38_W, SKETCH38_H)
        with Locations((24, 7.75)):
            Rectangle(SKETCH38_W, SKETCH38_H)
        with Locations((0, -27.25)):
            Rectangle(SKETCH38_W_2, SKETCH38_H_2)
    extrude(amount=CUT_EXTRUDE29_DEPTH + CUT_EXTRUDE29_DEPTH_BACK, mode=Mode.SUBTRACT)

    # Sketch39 → Cut-Extrude30 (cut, through all)
    with BuildSketch(Plane(origin=(23, 0, 0), x_dir=(0, 0, -1), z_dir=(1, 0, 0))):
        with Locations((53.861691874, -33.720666231)):
            Rectangle(SKETCH39_W, SKETCH39_H)
    extrude(amount=-CUT_EXTRUDE30_DEPTH, mode=Mode.SUBTRACT)

    # Sketch41 → Boss-Extrude9 (add)
    with BuildSketch(Plane.XZ.offset(42)):
        Polygon((-11, 23.25), (-23, 23.25), (-23, -42.75), (23, -42.75), (23, 23.25), (11, 23.25), (11, -13.75), (-11, -13.75), align=None)
    extrude(amount=BOSS_EXTRUDE9_DEPTH)

    # Sketch42 → Cut-Extrude31 (cut, through all)
    with BuildSketch(Plane(origin=(23, 0, 0), x_dir=(0, 0, -1), z_dir=(1, 0, 0))):
        Polygon((16.25, -24), (27.5, -12.75), (19.545048712, -4.795048712), (8.295048712, -16.045048712), align=None)
    extrude(amount=-CUT_EXTRUDE31_DEPTH, mode=Mode.SUBTRACT)

    # Sketch44 → Cut-Extrude32 (cut, through all)
    with BuildSketch(Plane(origin=(23, 0, 0), x_dir=(0, 0, -1), z_dir=(1, 0, 0))):
        with Locations((27.5, -4.75)):
            Circle(SKETCH44_R)
        with Locations((35.5, -12.75)):
            Circle(SKETCH44_R)
        with Locations((27.5, -20.75)):
            Circle(SKETCH44_R)
    extrude(amount=-CUT_EXTRUDE32_DEPTH, mode=Mode.SUBTRACT)

    # Sketch45 → Cut-Extrude33 (cut)
    # profile 1 of 3: a face of its own
    with BuildSketch(Plane(origin=(23, 0, 0), x_dir=(0, 0, -1), z_dir=(1, 0, 0))):
        with BuildLine():
            Line((29, -4.75), (29, -1.60044844))
            ThreePointArc((29, -1.60044844), (27.5, -1.5), (26, -1.60044844))
            Line((26, -1.60044844), (26, -4.75))
            ThreePointArc((26, -4.75), (27.5, -6.25), (29, -4.75))
        make_face()
        with Locations((27.5, -4.75)):
            Circle(SKETCH45_R, mode=Mode.SUBTRACT)
    # profile 2 of 3: a face of its own
    with BuildSketch(Plane(origin=(23, 0, 0), x_dir=(0, 0, -1), z_dir=(1, 0, 0))):
        with BuildLine():
            ThreePointArc((38.75, -12.75), (38.7248598, -11.998320233), (38.64955156, -11.25))
            Line((38.64955156, -11.25), (35.5, -11.25))
            ThreePointArc((35.5, -11.25), (34, -12.75), (35.5, -14.25))
            Line((35.5, -14.25), (38.75, -14.25))
            Line((38.75, -14.25), (38.75, -12.75))
        make_face()
        with Locations((35.5, -12.75)):
            Circle(SKETCH45_R, mode=Mode.SUBTRACT)
    # profile 3 of 3: a face of its own
    with BuildSketch(Plane(origin=(23, 0, 0), x_dir=(0, 0, -1), z_dir=(1, 0, 0))):
        with Locations((27.5, -20.75)):
            Circle(SKETCH45_R_2)
        with Locations((27.5, -20.75)):
            Circle(SKETCH45_R, mode=Mode.SUBTRACT)
    cut_extrude33 = extrude(amount=-CUT_EXTRUDE33_DEPTH, mode=Mode.SUBTRACT)

    # Mirror4: Cut-Extrude33 across plane
    add(cut_extrude33.mirror(Plane(origin=(0, 0, 0), x_dir=(0, 0, 1), z_dir=(1, 0, 0))), mode=Mode.SUBTRACT)


solid = part.part
